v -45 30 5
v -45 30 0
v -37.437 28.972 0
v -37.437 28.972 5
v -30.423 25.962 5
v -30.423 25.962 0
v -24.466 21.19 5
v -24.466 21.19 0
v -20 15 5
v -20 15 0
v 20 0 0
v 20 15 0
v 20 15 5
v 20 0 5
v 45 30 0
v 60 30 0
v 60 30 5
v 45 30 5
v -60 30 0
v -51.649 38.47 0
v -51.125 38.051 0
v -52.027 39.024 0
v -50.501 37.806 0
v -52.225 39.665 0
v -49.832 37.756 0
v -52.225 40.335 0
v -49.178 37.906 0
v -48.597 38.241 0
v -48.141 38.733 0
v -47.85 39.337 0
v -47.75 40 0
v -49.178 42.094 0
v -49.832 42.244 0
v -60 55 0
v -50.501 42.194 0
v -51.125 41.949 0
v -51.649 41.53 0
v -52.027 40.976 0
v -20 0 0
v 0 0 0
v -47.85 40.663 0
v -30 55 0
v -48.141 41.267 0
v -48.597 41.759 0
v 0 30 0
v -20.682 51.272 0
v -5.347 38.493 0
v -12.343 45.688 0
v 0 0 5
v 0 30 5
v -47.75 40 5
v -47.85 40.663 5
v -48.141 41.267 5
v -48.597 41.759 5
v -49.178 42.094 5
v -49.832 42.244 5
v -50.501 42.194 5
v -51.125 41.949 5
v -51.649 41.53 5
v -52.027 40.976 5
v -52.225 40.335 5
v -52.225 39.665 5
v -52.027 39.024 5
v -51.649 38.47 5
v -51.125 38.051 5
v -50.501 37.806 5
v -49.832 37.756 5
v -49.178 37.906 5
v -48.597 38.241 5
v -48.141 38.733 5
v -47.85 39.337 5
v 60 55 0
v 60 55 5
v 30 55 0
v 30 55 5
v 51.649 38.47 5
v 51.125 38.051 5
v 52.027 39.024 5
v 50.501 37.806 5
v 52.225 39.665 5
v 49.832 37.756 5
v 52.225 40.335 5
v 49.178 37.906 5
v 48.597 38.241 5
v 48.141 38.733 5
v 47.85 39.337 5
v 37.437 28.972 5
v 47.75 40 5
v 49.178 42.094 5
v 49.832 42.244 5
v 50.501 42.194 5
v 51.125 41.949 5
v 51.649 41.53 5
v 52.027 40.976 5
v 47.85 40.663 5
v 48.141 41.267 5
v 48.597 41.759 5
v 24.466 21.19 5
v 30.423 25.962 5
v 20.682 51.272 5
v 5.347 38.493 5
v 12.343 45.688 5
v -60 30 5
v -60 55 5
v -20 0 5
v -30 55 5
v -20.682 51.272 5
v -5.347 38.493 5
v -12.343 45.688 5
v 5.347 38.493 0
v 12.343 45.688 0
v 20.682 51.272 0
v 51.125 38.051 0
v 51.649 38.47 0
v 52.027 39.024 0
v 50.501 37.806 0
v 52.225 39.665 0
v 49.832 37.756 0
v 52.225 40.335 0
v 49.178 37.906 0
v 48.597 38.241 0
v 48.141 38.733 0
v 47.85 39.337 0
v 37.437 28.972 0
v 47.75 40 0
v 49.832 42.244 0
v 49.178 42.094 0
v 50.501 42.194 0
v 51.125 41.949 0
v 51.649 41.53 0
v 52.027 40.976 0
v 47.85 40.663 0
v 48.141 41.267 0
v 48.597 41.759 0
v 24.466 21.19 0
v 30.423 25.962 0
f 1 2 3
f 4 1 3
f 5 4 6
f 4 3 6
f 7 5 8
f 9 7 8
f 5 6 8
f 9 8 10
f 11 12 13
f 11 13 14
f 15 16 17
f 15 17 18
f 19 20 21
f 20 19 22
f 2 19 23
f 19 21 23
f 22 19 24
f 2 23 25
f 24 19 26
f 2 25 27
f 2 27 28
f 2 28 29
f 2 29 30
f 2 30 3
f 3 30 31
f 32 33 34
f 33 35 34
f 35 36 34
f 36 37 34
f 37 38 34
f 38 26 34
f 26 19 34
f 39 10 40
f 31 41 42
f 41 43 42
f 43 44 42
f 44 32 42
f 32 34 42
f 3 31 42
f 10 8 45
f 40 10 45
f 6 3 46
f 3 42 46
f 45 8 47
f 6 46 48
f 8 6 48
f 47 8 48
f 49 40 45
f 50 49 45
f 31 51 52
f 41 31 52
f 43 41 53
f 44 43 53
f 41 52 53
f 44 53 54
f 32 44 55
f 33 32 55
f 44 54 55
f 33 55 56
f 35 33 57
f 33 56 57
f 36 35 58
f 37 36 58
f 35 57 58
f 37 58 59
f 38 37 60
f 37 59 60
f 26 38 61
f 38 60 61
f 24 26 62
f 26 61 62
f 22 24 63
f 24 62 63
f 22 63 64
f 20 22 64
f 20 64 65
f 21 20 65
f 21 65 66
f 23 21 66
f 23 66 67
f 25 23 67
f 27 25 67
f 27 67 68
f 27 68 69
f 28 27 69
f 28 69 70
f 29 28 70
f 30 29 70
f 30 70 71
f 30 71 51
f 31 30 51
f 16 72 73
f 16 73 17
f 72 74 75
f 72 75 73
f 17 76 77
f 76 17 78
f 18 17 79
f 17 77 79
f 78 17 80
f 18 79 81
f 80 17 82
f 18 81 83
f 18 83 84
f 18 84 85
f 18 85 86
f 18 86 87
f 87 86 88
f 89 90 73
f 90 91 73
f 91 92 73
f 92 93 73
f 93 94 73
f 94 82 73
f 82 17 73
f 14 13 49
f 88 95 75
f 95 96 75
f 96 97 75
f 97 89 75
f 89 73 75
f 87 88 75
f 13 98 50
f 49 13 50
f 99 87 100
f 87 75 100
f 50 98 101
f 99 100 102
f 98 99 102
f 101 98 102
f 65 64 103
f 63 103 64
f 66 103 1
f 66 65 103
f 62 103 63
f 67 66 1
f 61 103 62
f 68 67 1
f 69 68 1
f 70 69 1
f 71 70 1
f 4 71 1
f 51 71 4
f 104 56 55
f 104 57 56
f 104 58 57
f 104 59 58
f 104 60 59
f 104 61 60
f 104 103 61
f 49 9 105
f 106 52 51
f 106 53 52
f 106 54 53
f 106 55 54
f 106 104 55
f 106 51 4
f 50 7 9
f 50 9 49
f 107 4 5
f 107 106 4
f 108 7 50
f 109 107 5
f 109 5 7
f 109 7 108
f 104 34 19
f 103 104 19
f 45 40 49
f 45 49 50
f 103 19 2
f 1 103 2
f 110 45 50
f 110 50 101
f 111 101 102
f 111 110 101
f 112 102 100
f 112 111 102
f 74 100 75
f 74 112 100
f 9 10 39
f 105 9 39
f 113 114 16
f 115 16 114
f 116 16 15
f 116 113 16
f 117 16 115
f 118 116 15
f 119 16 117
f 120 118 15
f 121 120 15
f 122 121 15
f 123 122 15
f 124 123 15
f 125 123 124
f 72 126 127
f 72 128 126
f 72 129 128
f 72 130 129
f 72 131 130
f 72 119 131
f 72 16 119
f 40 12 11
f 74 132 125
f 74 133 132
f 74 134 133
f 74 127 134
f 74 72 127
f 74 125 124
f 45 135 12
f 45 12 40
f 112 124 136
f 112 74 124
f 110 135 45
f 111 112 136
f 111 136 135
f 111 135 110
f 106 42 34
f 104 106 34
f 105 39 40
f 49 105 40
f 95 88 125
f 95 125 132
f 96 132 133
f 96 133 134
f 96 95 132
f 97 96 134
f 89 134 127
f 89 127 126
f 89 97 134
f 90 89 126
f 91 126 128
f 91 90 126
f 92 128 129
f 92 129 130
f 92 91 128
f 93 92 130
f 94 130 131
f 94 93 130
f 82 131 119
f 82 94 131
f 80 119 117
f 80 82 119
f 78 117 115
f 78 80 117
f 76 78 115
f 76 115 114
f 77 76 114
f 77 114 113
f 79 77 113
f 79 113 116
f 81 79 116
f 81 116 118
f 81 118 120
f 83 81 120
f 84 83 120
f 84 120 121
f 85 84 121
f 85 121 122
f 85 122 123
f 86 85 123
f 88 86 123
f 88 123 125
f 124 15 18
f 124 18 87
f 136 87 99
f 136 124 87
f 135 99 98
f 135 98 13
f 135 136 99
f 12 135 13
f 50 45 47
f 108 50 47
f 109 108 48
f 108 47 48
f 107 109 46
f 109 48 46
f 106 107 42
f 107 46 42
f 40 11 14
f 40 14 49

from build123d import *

# Parameters (mm, degrees)
F1_DEPTH = 5
F2_R     = 2.25
F3_DEPTH = 5.001


with BuildPart() as f1:
    # F0 (on Top) → F1 (new body)
    with BuildSketch(Plane.XY):
        with BuildLine():
            Line((-20, 0), (0, 0))
            Line((0, 0), (0, 30))
            ThreePointArc((0, 30), (-12.343257, 45.688092), (-30, 55))
            Line((-30, 55), (-60, 55))
            Line((-60, 55), (-60, 30))
            Line((-60, 30), (-45, 30))
            ThreePointArc((-45, 30), (-30.42262, 25.9623), (-20, 15))
            Line((-20, 15), (-20, 0))
        make_face()
    extrude(amount=F1_DEPTH)

    # F2 (on face) → F3 (cut, through all)
    with BuildSketch(Plane.XY.offset(5)):
        with Locations((-50, 40)):
            Circle(F2_R)
    extrude(amount=-F3_DEPTH, mode=Mode.SUBTRACT)


with BuildPart() as f4_1:
    # F4: instance of F1
    add(f1.part.mirror(Plane.YZ))


solid = Compound([f1.part, f4_1.part])
